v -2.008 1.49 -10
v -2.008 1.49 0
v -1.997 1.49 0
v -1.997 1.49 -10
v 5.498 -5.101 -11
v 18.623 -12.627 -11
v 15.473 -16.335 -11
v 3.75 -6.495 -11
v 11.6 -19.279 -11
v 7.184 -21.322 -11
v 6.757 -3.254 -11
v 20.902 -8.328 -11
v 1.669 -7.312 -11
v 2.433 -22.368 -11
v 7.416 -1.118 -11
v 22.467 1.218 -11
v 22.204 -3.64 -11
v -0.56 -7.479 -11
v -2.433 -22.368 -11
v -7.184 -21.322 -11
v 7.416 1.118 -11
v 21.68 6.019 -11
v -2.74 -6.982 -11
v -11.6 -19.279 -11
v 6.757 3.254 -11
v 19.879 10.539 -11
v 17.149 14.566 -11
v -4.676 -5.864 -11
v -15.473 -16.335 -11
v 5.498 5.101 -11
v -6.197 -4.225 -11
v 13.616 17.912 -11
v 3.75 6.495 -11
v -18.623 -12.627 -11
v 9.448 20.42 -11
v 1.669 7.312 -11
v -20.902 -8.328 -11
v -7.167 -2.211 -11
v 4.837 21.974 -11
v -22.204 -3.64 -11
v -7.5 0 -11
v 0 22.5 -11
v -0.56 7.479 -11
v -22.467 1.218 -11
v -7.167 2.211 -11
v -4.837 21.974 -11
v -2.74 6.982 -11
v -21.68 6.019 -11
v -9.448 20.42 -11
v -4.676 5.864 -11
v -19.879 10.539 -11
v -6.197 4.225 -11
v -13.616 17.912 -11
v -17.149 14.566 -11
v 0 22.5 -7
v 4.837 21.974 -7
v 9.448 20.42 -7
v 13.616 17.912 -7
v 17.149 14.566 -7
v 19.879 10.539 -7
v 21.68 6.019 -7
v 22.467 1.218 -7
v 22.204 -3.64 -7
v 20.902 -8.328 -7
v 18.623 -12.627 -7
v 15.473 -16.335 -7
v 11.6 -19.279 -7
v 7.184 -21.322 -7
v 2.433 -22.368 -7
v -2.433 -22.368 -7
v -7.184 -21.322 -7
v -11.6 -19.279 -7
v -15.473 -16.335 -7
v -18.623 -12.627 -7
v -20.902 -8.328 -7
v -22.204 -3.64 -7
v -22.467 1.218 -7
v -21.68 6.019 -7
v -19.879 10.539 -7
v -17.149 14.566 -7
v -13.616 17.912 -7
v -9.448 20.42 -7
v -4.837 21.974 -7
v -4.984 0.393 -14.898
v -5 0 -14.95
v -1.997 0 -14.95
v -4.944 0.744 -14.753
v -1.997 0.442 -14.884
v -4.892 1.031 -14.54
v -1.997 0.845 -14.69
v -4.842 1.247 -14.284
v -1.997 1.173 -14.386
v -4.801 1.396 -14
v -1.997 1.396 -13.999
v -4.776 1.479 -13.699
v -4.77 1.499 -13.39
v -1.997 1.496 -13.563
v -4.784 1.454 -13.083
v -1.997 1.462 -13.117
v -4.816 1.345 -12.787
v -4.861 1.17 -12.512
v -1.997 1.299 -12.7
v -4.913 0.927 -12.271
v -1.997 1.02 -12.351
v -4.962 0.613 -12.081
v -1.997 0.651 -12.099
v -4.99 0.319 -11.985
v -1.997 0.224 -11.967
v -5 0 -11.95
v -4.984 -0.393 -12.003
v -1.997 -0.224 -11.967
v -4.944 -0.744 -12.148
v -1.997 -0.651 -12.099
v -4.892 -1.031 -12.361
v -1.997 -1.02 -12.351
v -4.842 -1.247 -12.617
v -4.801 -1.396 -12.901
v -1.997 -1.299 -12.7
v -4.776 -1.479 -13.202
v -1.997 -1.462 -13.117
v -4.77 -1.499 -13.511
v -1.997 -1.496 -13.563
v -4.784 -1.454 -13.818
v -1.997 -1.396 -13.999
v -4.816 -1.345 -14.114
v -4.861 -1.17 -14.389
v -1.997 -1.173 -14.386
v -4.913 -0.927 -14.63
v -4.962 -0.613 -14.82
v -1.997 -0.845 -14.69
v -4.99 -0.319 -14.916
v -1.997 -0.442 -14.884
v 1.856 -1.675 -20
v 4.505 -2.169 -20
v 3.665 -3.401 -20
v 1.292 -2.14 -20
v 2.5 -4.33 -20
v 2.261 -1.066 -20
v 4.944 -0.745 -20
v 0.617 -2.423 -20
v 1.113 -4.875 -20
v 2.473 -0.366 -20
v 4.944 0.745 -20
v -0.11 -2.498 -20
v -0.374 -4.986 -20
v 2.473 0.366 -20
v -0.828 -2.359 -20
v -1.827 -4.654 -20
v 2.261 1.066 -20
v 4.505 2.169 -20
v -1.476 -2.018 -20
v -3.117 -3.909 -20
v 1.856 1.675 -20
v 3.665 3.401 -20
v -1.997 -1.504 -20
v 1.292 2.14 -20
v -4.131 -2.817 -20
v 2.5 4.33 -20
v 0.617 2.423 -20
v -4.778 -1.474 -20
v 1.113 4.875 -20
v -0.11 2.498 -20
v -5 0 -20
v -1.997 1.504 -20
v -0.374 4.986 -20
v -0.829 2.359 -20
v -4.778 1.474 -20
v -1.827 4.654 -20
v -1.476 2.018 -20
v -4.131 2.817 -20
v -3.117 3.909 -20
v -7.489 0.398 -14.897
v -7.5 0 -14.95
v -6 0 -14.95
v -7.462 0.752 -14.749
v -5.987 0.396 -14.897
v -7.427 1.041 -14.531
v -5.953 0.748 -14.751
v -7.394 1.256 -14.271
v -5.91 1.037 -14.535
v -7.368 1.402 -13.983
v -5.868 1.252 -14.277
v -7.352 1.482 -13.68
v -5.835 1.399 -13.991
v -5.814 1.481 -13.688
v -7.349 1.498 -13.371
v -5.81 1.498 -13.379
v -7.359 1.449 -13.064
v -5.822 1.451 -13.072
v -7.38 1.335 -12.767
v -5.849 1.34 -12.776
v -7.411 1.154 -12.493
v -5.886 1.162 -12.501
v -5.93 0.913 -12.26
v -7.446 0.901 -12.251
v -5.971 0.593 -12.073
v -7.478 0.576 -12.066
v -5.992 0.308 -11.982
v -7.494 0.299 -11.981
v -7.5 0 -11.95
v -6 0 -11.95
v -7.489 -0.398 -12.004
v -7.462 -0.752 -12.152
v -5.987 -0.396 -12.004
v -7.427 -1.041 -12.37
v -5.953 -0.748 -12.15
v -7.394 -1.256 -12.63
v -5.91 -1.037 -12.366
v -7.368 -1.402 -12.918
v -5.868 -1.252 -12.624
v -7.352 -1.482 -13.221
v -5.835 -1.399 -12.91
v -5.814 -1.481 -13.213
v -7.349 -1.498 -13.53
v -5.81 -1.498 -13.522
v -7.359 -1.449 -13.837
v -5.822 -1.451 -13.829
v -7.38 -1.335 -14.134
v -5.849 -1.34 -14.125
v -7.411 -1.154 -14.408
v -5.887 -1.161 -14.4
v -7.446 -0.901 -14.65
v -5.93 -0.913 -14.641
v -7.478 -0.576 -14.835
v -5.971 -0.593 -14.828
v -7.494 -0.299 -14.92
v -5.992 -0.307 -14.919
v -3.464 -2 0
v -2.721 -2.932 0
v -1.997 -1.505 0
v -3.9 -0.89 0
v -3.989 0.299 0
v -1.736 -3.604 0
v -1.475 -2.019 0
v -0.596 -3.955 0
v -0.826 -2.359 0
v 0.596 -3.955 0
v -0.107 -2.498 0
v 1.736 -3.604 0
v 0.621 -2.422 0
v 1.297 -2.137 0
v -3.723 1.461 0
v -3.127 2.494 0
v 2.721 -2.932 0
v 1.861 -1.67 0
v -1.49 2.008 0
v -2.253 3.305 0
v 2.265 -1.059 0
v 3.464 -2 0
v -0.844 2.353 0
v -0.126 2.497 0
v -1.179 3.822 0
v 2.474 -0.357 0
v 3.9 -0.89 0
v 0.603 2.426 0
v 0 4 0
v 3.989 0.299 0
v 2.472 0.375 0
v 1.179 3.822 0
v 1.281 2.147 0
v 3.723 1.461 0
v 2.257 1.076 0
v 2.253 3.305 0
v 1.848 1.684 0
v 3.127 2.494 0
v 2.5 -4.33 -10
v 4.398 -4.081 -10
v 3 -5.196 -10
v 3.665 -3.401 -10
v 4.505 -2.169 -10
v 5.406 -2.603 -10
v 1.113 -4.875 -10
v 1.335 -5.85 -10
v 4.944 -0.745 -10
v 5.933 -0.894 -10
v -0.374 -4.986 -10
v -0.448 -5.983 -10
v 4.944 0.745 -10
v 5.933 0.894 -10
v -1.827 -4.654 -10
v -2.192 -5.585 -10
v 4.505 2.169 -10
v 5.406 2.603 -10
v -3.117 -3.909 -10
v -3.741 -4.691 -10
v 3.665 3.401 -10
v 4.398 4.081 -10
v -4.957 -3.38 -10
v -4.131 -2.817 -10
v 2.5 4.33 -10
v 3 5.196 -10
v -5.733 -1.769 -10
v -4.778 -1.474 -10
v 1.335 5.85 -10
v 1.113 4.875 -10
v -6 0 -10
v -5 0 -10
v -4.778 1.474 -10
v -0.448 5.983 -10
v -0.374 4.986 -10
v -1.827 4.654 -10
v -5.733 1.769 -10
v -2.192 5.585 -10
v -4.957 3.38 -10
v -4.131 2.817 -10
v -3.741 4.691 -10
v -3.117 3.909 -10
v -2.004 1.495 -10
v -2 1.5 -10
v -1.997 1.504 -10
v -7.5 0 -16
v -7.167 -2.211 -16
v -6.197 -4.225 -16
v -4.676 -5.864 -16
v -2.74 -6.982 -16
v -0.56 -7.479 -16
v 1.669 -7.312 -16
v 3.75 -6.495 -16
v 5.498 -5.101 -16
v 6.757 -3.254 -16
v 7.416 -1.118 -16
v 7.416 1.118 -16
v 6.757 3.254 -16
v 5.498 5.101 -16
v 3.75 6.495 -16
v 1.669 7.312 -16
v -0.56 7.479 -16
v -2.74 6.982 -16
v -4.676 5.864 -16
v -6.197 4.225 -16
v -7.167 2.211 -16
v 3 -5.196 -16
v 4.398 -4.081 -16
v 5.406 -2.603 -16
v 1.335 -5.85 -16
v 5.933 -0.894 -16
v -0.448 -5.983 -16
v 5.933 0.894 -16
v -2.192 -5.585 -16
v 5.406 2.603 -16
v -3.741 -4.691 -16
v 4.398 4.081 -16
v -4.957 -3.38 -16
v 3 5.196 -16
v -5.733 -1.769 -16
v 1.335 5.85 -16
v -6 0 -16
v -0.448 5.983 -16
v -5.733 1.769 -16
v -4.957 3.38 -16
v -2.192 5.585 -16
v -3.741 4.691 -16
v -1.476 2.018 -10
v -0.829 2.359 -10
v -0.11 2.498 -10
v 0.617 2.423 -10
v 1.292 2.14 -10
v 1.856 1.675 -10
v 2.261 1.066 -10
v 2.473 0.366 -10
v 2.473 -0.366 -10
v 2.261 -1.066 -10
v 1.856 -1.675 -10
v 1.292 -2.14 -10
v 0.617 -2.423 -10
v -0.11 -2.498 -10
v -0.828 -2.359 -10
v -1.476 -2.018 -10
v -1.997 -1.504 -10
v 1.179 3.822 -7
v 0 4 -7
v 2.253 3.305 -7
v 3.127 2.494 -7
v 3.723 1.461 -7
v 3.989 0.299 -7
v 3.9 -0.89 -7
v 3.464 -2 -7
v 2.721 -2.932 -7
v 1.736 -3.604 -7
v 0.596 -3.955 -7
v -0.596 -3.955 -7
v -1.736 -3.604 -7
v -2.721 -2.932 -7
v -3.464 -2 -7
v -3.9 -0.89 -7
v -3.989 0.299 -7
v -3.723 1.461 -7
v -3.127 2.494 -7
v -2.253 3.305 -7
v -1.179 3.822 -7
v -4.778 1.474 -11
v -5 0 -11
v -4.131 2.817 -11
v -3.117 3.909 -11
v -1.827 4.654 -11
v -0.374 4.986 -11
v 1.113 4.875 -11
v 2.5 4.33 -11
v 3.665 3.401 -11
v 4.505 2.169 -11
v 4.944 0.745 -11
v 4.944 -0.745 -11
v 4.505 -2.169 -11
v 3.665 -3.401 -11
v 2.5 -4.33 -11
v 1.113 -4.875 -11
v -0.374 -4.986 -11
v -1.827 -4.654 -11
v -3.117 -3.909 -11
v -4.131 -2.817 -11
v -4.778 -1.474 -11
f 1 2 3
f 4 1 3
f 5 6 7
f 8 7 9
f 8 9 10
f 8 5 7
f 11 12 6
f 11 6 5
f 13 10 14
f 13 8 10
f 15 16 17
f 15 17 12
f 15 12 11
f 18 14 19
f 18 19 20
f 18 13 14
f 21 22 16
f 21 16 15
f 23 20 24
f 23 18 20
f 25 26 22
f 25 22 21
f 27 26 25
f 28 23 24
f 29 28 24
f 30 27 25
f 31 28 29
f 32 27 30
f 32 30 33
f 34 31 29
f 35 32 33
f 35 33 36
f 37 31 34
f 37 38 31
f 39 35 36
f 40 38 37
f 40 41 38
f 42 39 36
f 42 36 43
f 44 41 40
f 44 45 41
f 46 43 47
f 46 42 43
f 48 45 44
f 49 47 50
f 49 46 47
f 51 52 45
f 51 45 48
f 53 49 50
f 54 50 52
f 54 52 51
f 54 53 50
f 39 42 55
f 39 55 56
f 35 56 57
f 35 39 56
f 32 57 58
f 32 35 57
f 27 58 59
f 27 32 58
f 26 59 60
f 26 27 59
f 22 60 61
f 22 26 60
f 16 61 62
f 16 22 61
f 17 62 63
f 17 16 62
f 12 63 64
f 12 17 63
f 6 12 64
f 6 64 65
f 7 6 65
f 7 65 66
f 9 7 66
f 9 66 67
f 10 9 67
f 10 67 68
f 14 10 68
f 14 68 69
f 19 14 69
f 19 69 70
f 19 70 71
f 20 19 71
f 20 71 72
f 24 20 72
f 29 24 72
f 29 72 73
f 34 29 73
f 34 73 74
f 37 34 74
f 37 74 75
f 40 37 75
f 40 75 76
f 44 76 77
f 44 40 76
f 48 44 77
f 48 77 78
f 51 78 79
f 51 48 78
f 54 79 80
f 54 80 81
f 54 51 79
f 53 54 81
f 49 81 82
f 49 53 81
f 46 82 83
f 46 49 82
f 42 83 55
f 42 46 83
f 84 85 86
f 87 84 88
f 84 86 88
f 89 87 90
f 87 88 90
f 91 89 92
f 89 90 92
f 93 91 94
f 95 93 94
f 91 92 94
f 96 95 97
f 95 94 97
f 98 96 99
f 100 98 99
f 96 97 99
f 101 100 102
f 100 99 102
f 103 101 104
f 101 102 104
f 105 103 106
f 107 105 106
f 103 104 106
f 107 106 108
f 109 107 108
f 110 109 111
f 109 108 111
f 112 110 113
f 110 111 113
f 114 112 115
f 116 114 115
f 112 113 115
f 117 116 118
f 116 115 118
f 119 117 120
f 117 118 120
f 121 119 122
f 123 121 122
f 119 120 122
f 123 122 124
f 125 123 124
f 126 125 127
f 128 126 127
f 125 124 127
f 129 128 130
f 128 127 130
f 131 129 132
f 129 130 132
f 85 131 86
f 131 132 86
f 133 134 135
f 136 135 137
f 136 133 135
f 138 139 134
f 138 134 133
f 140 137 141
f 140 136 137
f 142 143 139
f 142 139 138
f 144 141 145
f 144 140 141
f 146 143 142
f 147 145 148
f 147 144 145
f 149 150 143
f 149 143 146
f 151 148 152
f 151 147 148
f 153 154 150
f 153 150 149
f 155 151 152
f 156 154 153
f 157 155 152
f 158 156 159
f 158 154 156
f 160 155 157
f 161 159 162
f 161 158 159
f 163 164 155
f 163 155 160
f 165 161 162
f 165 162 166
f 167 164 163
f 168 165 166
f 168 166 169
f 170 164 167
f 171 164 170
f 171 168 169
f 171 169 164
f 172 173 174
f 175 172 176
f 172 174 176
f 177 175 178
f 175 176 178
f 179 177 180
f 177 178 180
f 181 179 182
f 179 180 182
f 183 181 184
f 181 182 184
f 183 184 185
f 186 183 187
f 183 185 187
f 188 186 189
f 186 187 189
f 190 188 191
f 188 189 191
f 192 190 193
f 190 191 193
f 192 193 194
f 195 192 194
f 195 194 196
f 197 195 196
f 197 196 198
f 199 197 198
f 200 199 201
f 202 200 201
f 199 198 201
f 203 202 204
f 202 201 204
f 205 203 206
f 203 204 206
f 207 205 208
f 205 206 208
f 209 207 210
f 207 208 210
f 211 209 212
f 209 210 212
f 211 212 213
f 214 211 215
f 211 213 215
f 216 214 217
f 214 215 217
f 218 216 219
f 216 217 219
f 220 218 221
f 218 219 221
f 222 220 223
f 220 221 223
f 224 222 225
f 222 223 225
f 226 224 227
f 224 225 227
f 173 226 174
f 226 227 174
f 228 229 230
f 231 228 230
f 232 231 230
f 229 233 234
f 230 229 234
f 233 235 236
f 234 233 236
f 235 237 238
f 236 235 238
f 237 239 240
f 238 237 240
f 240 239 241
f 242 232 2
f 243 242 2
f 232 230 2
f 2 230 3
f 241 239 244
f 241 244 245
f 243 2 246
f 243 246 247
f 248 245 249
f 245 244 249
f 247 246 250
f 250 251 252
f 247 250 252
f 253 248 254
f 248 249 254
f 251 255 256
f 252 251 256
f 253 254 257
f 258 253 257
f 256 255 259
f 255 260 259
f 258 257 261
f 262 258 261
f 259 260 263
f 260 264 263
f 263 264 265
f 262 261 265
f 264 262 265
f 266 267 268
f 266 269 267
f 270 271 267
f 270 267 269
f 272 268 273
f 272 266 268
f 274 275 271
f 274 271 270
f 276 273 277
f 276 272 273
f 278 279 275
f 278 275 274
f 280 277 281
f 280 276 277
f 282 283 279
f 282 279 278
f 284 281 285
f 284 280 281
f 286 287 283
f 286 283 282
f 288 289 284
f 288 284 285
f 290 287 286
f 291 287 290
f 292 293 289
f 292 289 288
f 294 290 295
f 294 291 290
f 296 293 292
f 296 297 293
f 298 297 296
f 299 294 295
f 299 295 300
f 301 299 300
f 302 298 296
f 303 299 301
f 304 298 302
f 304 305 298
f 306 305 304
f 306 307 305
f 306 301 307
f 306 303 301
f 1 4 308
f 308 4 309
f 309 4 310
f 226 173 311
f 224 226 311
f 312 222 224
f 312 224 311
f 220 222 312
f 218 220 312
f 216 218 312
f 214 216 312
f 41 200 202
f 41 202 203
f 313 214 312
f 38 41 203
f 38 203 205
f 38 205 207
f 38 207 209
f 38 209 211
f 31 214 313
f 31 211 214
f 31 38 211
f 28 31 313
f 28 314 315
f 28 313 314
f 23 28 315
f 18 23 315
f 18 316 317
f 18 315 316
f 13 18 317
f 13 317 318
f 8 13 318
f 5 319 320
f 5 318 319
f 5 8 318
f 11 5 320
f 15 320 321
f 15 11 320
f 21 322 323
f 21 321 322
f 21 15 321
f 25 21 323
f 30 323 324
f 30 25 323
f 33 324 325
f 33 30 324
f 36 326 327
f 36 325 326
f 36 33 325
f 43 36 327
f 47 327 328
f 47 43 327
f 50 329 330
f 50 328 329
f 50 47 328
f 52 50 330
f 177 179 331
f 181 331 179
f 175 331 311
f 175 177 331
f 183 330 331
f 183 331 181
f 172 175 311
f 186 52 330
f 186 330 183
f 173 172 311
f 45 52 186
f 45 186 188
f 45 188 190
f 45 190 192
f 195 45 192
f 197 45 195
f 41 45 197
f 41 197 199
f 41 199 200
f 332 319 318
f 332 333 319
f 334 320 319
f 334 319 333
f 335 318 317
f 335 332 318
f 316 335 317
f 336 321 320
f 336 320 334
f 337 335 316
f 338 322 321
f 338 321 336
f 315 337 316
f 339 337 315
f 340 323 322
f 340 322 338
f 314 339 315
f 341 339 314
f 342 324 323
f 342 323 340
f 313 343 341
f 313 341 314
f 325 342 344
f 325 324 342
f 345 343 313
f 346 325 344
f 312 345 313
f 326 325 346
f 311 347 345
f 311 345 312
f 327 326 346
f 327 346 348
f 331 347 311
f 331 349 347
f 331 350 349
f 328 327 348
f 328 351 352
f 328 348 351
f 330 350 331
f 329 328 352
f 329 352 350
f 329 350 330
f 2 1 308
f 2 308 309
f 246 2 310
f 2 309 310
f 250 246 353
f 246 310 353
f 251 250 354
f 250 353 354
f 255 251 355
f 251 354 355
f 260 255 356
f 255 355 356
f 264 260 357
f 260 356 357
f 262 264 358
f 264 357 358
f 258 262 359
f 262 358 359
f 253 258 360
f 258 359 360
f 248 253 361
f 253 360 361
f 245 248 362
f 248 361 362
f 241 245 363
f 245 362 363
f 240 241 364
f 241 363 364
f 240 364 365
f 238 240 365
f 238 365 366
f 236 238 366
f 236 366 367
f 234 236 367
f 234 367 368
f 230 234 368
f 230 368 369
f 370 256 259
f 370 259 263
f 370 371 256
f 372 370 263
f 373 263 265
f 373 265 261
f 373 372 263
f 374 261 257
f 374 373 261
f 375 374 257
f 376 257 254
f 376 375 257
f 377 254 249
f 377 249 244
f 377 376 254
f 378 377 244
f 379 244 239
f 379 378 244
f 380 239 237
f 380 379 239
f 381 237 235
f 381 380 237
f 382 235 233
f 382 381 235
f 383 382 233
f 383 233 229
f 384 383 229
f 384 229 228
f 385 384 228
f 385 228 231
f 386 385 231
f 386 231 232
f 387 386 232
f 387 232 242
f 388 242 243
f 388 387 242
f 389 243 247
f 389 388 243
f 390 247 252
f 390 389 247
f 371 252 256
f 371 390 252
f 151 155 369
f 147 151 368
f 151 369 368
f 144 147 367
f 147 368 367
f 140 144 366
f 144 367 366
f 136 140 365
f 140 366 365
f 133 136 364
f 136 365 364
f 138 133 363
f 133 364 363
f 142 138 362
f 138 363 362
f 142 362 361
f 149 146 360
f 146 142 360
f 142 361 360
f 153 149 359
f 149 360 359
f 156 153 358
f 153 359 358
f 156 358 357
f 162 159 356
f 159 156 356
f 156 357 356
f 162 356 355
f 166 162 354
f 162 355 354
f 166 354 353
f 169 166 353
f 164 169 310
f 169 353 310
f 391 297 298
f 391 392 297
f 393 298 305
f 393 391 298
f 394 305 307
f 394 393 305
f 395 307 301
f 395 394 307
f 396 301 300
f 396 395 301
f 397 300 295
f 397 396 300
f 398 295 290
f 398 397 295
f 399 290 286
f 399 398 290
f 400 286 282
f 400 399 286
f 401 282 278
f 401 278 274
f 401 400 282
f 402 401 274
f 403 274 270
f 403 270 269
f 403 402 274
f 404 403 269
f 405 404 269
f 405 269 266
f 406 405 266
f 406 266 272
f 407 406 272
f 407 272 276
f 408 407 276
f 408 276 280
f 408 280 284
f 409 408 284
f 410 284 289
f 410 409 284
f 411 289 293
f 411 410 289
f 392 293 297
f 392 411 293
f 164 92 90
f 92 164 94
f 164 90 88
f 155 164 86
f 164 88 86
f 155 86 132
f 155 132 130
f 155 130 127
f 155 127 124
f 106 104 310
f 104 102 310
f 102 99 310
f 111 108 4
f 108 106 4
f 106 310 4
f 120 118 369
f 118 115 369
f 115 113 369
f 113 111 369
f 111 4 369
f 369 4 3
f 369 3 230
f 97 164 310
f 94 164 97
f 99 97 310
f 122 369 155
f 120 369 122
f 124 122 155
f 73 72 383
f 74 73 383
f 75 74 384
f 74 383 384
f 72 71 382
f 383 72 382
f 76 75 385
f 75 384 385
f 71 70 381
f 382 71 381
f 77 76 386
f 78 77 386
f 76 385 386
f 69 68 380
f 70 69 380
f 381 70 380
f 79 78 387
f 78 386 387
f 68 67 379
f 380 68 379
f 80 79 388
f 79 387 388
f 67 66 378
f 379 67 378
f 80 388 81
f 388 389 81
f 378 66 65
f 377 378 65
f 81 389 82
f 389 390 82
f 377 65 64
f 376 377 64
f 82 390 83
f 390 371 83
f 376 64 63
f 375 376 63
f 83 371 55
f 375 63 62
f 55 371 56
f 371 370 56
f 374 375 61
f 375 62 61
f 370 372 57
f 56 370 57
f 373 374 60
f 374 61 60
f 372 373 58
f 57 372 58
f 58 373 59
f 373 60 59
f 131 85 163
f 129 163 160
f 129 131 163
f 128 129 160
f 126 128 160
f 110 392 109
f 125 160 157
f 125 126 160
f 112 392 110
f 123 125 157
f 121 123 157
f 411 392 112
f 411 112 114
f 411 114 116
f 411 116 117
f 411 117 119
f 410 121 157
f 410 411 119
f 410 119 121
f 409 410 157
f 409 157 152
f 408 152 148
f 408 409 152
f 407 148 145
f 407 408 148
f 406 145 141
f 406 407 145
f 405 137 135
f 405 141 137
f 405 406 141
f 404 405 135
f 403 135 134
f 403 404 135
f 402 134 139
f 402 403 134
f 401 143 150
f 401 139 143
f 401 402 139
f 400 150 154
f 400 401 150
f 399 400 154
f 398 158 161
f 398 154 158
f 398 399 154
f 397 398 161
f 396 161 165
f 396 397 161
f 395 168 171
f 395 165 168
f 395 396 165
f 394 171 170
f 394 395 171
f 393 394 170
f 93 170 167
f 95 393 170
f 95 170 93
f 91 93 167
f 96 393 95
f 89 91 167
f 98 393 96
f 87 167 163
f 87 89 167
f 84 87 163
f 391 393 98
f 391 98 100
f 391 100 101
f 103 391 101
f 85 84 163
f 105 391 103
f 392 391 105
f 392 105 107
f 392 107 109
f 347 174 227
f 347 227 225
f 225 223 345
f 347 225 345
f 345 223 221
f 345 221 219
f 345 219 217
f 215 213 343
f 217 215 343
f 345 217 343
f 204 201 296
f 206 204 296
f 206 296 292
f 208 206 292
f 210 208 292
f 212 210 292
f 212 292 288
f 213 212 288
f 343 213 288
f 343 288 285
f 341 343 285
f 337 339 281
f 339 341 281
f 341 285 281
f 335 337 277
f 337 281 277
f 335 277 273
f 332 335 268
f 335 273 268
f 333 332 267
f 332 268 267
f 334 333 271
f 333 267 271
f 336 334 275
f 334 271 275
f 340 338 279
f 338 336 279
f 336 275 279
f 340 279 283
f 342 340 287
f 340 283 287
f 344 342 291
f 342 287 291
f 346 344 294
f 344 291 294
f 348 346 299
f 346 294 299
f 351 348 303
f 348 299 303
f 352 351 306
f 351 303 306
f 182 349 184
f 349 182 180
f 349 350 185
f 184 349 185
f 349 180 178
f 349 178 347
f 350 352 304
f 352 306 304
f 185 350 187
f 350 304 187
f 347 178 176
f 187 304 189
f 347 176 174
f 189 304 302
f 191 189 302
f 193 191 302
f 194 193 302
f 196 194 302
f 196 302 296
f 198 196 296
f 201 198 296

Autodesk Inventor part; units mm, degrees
ref_plane "YZ Plane" through (0, 0, 0) normal (1, 0, 0) x (0, 1, 0)
ref_plane "XZ Plane" through (0, 0, 0) normal (0, 1, 0) x (-1, 0, 0)
ref_plane "XY Plane" through (0, 0, 0) normal (0, 0, 1) x (1, 0, 0)
sketch "Sketch1" plane through (0, 0, 0) normal (1, 0, 0) x (0, 1, 0)
  line L0 (0, 0) -> (2.5, 0)
  line L1 (0, 0) -> (4, 0)
  line L2 (2.5, 0) -> (2.5, -7)
  line L3 (2.5, -7) -> (0, -7)
  line L4 (0, -7) -> (20, -7)
  line L5 (4, 0) -> (4, -7)
  line L6 (2.5, -7) -> (2.5, -41)
  line L7 (20, -7) -> (20, -11)
  line L8 (20, -11) -> (2.5, -11)
  line L9 (20, -7) -> (22.5, -7)
  line L10 (22.5, -7) -> (22.5, -11)
  line L11 (22.5, -11) -> (20, -11)
  line L12 (20, -11) -> (20, -7)
  line L13 (20, -7) -> (20, -11)
  line L14 (4, 0) -> (2.5, 0)
  line L15 (2.5, 0) -> (2.5, -11)
  line L16 (2.5, -11) -> (4, -11)
  line L17 (4, -11) -> (4, 0)
  line L18 (2.5, -11) -> (22.5, -11)
  line L19 (22.5, -11) -> (22.5, -7)
  line L20 (22.5, -7) -> (2.5, -7)
  line L21 (2.5, -7) -> (2.5, -11)
  line L22 (2.5, -11) -> (6.5, -11)
  line L23 (0, -7) -> (0, -105.9451)
  line L24 (2.5, -41) -> (25, -41)
  line L25 (0, -82) -> (2.5, -82)
  line L26 (0, -82) -> (4, -82)
  line L27 (2.5, -82) -> (2.5, -75)
  line L28 (2.5, -75) -> (0, -75)
  line L29 (0, -75) -> (20, -75)
  line L30 (4, -82) -> (4, -75)
  line L31 (20, -75) -> (20, -71)
  line L32 (20, -71) -> (2.5, -71)
  line L33 (20, -75) -> (22.5, -75)
  line L34 (22.5, -75) -> (22.5, -71)
  line L35 (22.5, -71) -> (20, -71)
  line L36 (20, -71) -> (20, -75)
  line L37 (20, -75) -> (20, -71)
  line L38 (4, -82) -> (2.5, -82)
  line L39 (2.5, -82) -> (2.5, -71)
  line L40 (2.5, -71) -> (4, -71)
  line L41 (4, -71) -> (4, -82)
  line L42 (2.5, -71) -> (22.5, -71)
  line L43 (22.5, -71) -> (22.5, -75)
  line L44 (22.5, -75) -> (2.5, -75)
  line L45 (2.5, -75) -> (2.5, -71)
  line L46 (2.5, -71) -> (6.5, -71)
  line L47 (2.5, -11) -> (6.5, -11)
  line L48 (6.5, -11) -> (6.5, -71)
  line L49 (6.5, -71) -> (2.5, -71)
  line L50 (2.5, -71) -> (2.5, -11)
  line L51 (6.5, -11) -> (9.5, -11)
  line L52 (9.5, -11) -> (9.5, -14)
  line L53 (9.5, -14) -> (6.5, -14)
  line L54 (6.5, -14) -> (6.5, -11)
  line L55 (6.5, -71) -> (9.5, -71)
  line L56 (9.5, -71) -> (9.5, -68)
  line L57 (9.5, -68) -> (6.5, -68)
  line L58 (6.5, -68) -> (6.5, -71)
  dimension "d1" = 2.5
  dimension "d2" = 4
  dimension "d3" = 7
  dimension "d4" = 20
  dimension "d5" = 34
  dimension "d9" = 4
  dimension "d12" = 2.5
  dimension "d13" = 4
  dimension "d55" = 22.5
  dimension "d56" = 4
  dimension "d80" = 3
  dimension "d81" = 3
  dimension "d82" = 3
  dimension "d83" = 3
revolve "Revolution2" add sketch "Sketch1" angle 360 about axis through (0, 0, -7) along (0, 0, -1) contours L1 L5 L4 L2 | L4 L17 L8 L6 | L4 L7 L8 L17 | L8 L48 L24 L6 | L9 L10 L11 L7 | L24 L48 L32 L50 | L8 L52 L53 L48 | L29 L30 L26 L27 | L39 L32 L41 L29 | L41 L32 L31 L29 | L57 L56 L32 L48 | L31 L35 L34 L33
sketch "Sketch6" plane through (0, 0, 0) normal (0, 1, 0) x (-1, 0, 0)
  line L0 (-2.5, -82) -> (2.5, -82) projected
  line L1 (0, -82) -> (0, -62)
  line L2 (0, -82) -> (20, -82) construction
  line L3 (0, -65) -> (15, -65) construction
  line L4 (0, -59) -> (15, -59) construction
  line L5 (10.6066, -48.3934) -> (10.6066, -54.3934)
  line L6 (0, -65) -> (0, -59)
  line L7 (0, -62) -> (0, -59.5)
  line L8 (0, -59.5) -> (10.6066, -48.8934)
  line L9 (10.6066, -48.8934) -> (10.6066, -53.8934)
  line L10 (10.6066, -53.8934) -> (0, -64.5)
  line L11 (0, -59.5) -> (0, -64.5)
  point P0 (0, 0)
  dimension "d64" = 20
  dimension "d65" = 90
  dimension "d69" = 15
  dimension "d71" = 15
  dimension "d75" = 2.5
  dimension "d76" = 5
extrude "Extrusion6" cut sketch "Sketch6" along normal mid plane 5
sketch "Sketch7" plane through (0, 0, 0) normal (0, 0, 1) x (1, 0, 0)
  arc A0 (-1.9966, -1.5104) -> (-1.9966, 1.4896) centre (0.0034, -0.0104) ccw
  line L0 (-1.9966, -0.0104) -> (-1.9966, 1.4896)
  line L1 (-1.9966, -0.0104) -> (-1.9966, -1.5104)
  line L2 (-1.9966, 1.4896) -> (-1.9966, -2.007)
  line L3 (-1.9966, -2.007) -> (-3.9862, -2.007)
  line L4 (-3.9862, -2.007) -> (-3.9862, 1.4896)
  line L5 (-3.9862, 1.4896) -> (-1.9966, 1.4896)
  line L6 (-1.9966, -1.5104) -> (-3.2272, -1.5104)
  line L7 (-3.2272, -1.5104) -> (-3.2272, 1.4896)
  line L8 (-3.2272, 1.4896) -> (-1.9966, 1.4896)
  line L9 (-1.9966, 1.4896) -> (-1.9966, -1.5104)
  point P0 (0, 0)
  point P1 (0, 0)
  dimension "d77" = 5
extrude "Extrusion7" add sketch "Sketch7" against normal blind 26 contours L6 L7 L5 L0 L1
sketch "Sketch8" plane through (0, 0, -14) normal (0, 0, -1) x (-1, 0, 0)
  circle A0 centre (0, 0) radius 6.5
  dimension "d84" = 13
extrude "Extrusion8" cut sketch "Sketch8" against normal blind 4
sketch "Sketch9" plane through (0, 0, -14) normal (0, 0, -1) x (-1, 0, 0)
  circle A0 centre (0, 0) radius 22.5
extrude "Extrusion9" cut sketch "Sketch9" along normal blind 400
sketch "Sketch10" plane through (0, 0, -14) normal (0, 0, -1) x (-1, 0, 0)
  circle A0 centre (0, 0) radius 9.5
  circle A1 centre (0, 0) radius 6.5
extrude "Extrusion10" cut sketch "Sketch10" against normal blind 5
sketch "Sketch11" plane through (0, 0, -10) normal (0, 0, -1) x (-1, 0, 0)
  circle A0 centre (0, 0) radius 5
  circle A1 centre (0, 0) radius 4 projected
  circle A2 centre (0, 0) radius 2.5
  arc A3 (2.0077, 1.4896) -> (1.9966, -1.5045) centre (0, 0) ccw projected
  line L0 (1.9966, -1.5045) -> (3.0554, -1.5045)
  line L1 (3.0554, -1.5045) -> (3.0554, 1.7409)
  line L2 (3.0554, 1.7409) -> (1.9966, 1.7409)
  line L3 (1.9966, 1.7409) -> (1.9966, -1.5045)
  dimension "d91" = 10
  dimension "d92" = 5
extrude "Extrusion11" add sketch "Sketch11" along normal blind 10 contours A0 | A1 | A2 L3 | A2 L3 L2 L1 L0 picked at (2.0884, -0.3478)
sketch "Sketch12" plane through (0, 0, -9) normal (0, 0, -1) x (-1, 0, 0)
  circle A0 centre (0, 0) radius 5
  circle A1 centre (0, 0) radius 9.5
extrude "Extrusion12" add sketch "Sketch12" along normal blind 2
sketch "Sketch13" plane through (0, 0, -11) normal (0, 0, -1) x (-1, 0, 0)
  circle A0 centre (0, 0) radius 5
  circle A1 centre (0, 0) radius 6
  dimension "d97" = 12
extrude "Extrusion13" cut sketch "Sketch13" against normal blind 1
sketch "Sketch14" plane through (0, 0, -11) normal (0, 0, -1) x (-1, 0, 0)
  circle A0 centre (0, 0) radius 5 projected
  circle A1 centre (0, 0) radius 6
  circle A2 centre (0, 0) radius 7.5
  dimension "d100" = 15
extrude "Extrusion14" add sketch "Sketch14" along normal blind 5 contours A2
sketch "Sketch15" plane through (-1.9966, -1.5045, 0) normal (1, 0, 0) x (0, 0, -1)
  line L0 (20, 0) -> (20, 3.009) projected
  line L1 (20, 1.5045) -> (0, 1.5045)
  line L2 (20, 1.5045) -> (17.5, 1.5045)
  line L3 (15.9505, 1.5045) -> (13.4505, 1.5045)
  circle A0 centre (13.4505, 1.5045) radius 1.5
  dimension "d103" = 2.5
  dimension "d104" = 2.5
  dimension "d105" = 3
extrude "Extrusion15" cut sketch "Sketch15" against normal blind 20
properties part number "Spool_revB2"
